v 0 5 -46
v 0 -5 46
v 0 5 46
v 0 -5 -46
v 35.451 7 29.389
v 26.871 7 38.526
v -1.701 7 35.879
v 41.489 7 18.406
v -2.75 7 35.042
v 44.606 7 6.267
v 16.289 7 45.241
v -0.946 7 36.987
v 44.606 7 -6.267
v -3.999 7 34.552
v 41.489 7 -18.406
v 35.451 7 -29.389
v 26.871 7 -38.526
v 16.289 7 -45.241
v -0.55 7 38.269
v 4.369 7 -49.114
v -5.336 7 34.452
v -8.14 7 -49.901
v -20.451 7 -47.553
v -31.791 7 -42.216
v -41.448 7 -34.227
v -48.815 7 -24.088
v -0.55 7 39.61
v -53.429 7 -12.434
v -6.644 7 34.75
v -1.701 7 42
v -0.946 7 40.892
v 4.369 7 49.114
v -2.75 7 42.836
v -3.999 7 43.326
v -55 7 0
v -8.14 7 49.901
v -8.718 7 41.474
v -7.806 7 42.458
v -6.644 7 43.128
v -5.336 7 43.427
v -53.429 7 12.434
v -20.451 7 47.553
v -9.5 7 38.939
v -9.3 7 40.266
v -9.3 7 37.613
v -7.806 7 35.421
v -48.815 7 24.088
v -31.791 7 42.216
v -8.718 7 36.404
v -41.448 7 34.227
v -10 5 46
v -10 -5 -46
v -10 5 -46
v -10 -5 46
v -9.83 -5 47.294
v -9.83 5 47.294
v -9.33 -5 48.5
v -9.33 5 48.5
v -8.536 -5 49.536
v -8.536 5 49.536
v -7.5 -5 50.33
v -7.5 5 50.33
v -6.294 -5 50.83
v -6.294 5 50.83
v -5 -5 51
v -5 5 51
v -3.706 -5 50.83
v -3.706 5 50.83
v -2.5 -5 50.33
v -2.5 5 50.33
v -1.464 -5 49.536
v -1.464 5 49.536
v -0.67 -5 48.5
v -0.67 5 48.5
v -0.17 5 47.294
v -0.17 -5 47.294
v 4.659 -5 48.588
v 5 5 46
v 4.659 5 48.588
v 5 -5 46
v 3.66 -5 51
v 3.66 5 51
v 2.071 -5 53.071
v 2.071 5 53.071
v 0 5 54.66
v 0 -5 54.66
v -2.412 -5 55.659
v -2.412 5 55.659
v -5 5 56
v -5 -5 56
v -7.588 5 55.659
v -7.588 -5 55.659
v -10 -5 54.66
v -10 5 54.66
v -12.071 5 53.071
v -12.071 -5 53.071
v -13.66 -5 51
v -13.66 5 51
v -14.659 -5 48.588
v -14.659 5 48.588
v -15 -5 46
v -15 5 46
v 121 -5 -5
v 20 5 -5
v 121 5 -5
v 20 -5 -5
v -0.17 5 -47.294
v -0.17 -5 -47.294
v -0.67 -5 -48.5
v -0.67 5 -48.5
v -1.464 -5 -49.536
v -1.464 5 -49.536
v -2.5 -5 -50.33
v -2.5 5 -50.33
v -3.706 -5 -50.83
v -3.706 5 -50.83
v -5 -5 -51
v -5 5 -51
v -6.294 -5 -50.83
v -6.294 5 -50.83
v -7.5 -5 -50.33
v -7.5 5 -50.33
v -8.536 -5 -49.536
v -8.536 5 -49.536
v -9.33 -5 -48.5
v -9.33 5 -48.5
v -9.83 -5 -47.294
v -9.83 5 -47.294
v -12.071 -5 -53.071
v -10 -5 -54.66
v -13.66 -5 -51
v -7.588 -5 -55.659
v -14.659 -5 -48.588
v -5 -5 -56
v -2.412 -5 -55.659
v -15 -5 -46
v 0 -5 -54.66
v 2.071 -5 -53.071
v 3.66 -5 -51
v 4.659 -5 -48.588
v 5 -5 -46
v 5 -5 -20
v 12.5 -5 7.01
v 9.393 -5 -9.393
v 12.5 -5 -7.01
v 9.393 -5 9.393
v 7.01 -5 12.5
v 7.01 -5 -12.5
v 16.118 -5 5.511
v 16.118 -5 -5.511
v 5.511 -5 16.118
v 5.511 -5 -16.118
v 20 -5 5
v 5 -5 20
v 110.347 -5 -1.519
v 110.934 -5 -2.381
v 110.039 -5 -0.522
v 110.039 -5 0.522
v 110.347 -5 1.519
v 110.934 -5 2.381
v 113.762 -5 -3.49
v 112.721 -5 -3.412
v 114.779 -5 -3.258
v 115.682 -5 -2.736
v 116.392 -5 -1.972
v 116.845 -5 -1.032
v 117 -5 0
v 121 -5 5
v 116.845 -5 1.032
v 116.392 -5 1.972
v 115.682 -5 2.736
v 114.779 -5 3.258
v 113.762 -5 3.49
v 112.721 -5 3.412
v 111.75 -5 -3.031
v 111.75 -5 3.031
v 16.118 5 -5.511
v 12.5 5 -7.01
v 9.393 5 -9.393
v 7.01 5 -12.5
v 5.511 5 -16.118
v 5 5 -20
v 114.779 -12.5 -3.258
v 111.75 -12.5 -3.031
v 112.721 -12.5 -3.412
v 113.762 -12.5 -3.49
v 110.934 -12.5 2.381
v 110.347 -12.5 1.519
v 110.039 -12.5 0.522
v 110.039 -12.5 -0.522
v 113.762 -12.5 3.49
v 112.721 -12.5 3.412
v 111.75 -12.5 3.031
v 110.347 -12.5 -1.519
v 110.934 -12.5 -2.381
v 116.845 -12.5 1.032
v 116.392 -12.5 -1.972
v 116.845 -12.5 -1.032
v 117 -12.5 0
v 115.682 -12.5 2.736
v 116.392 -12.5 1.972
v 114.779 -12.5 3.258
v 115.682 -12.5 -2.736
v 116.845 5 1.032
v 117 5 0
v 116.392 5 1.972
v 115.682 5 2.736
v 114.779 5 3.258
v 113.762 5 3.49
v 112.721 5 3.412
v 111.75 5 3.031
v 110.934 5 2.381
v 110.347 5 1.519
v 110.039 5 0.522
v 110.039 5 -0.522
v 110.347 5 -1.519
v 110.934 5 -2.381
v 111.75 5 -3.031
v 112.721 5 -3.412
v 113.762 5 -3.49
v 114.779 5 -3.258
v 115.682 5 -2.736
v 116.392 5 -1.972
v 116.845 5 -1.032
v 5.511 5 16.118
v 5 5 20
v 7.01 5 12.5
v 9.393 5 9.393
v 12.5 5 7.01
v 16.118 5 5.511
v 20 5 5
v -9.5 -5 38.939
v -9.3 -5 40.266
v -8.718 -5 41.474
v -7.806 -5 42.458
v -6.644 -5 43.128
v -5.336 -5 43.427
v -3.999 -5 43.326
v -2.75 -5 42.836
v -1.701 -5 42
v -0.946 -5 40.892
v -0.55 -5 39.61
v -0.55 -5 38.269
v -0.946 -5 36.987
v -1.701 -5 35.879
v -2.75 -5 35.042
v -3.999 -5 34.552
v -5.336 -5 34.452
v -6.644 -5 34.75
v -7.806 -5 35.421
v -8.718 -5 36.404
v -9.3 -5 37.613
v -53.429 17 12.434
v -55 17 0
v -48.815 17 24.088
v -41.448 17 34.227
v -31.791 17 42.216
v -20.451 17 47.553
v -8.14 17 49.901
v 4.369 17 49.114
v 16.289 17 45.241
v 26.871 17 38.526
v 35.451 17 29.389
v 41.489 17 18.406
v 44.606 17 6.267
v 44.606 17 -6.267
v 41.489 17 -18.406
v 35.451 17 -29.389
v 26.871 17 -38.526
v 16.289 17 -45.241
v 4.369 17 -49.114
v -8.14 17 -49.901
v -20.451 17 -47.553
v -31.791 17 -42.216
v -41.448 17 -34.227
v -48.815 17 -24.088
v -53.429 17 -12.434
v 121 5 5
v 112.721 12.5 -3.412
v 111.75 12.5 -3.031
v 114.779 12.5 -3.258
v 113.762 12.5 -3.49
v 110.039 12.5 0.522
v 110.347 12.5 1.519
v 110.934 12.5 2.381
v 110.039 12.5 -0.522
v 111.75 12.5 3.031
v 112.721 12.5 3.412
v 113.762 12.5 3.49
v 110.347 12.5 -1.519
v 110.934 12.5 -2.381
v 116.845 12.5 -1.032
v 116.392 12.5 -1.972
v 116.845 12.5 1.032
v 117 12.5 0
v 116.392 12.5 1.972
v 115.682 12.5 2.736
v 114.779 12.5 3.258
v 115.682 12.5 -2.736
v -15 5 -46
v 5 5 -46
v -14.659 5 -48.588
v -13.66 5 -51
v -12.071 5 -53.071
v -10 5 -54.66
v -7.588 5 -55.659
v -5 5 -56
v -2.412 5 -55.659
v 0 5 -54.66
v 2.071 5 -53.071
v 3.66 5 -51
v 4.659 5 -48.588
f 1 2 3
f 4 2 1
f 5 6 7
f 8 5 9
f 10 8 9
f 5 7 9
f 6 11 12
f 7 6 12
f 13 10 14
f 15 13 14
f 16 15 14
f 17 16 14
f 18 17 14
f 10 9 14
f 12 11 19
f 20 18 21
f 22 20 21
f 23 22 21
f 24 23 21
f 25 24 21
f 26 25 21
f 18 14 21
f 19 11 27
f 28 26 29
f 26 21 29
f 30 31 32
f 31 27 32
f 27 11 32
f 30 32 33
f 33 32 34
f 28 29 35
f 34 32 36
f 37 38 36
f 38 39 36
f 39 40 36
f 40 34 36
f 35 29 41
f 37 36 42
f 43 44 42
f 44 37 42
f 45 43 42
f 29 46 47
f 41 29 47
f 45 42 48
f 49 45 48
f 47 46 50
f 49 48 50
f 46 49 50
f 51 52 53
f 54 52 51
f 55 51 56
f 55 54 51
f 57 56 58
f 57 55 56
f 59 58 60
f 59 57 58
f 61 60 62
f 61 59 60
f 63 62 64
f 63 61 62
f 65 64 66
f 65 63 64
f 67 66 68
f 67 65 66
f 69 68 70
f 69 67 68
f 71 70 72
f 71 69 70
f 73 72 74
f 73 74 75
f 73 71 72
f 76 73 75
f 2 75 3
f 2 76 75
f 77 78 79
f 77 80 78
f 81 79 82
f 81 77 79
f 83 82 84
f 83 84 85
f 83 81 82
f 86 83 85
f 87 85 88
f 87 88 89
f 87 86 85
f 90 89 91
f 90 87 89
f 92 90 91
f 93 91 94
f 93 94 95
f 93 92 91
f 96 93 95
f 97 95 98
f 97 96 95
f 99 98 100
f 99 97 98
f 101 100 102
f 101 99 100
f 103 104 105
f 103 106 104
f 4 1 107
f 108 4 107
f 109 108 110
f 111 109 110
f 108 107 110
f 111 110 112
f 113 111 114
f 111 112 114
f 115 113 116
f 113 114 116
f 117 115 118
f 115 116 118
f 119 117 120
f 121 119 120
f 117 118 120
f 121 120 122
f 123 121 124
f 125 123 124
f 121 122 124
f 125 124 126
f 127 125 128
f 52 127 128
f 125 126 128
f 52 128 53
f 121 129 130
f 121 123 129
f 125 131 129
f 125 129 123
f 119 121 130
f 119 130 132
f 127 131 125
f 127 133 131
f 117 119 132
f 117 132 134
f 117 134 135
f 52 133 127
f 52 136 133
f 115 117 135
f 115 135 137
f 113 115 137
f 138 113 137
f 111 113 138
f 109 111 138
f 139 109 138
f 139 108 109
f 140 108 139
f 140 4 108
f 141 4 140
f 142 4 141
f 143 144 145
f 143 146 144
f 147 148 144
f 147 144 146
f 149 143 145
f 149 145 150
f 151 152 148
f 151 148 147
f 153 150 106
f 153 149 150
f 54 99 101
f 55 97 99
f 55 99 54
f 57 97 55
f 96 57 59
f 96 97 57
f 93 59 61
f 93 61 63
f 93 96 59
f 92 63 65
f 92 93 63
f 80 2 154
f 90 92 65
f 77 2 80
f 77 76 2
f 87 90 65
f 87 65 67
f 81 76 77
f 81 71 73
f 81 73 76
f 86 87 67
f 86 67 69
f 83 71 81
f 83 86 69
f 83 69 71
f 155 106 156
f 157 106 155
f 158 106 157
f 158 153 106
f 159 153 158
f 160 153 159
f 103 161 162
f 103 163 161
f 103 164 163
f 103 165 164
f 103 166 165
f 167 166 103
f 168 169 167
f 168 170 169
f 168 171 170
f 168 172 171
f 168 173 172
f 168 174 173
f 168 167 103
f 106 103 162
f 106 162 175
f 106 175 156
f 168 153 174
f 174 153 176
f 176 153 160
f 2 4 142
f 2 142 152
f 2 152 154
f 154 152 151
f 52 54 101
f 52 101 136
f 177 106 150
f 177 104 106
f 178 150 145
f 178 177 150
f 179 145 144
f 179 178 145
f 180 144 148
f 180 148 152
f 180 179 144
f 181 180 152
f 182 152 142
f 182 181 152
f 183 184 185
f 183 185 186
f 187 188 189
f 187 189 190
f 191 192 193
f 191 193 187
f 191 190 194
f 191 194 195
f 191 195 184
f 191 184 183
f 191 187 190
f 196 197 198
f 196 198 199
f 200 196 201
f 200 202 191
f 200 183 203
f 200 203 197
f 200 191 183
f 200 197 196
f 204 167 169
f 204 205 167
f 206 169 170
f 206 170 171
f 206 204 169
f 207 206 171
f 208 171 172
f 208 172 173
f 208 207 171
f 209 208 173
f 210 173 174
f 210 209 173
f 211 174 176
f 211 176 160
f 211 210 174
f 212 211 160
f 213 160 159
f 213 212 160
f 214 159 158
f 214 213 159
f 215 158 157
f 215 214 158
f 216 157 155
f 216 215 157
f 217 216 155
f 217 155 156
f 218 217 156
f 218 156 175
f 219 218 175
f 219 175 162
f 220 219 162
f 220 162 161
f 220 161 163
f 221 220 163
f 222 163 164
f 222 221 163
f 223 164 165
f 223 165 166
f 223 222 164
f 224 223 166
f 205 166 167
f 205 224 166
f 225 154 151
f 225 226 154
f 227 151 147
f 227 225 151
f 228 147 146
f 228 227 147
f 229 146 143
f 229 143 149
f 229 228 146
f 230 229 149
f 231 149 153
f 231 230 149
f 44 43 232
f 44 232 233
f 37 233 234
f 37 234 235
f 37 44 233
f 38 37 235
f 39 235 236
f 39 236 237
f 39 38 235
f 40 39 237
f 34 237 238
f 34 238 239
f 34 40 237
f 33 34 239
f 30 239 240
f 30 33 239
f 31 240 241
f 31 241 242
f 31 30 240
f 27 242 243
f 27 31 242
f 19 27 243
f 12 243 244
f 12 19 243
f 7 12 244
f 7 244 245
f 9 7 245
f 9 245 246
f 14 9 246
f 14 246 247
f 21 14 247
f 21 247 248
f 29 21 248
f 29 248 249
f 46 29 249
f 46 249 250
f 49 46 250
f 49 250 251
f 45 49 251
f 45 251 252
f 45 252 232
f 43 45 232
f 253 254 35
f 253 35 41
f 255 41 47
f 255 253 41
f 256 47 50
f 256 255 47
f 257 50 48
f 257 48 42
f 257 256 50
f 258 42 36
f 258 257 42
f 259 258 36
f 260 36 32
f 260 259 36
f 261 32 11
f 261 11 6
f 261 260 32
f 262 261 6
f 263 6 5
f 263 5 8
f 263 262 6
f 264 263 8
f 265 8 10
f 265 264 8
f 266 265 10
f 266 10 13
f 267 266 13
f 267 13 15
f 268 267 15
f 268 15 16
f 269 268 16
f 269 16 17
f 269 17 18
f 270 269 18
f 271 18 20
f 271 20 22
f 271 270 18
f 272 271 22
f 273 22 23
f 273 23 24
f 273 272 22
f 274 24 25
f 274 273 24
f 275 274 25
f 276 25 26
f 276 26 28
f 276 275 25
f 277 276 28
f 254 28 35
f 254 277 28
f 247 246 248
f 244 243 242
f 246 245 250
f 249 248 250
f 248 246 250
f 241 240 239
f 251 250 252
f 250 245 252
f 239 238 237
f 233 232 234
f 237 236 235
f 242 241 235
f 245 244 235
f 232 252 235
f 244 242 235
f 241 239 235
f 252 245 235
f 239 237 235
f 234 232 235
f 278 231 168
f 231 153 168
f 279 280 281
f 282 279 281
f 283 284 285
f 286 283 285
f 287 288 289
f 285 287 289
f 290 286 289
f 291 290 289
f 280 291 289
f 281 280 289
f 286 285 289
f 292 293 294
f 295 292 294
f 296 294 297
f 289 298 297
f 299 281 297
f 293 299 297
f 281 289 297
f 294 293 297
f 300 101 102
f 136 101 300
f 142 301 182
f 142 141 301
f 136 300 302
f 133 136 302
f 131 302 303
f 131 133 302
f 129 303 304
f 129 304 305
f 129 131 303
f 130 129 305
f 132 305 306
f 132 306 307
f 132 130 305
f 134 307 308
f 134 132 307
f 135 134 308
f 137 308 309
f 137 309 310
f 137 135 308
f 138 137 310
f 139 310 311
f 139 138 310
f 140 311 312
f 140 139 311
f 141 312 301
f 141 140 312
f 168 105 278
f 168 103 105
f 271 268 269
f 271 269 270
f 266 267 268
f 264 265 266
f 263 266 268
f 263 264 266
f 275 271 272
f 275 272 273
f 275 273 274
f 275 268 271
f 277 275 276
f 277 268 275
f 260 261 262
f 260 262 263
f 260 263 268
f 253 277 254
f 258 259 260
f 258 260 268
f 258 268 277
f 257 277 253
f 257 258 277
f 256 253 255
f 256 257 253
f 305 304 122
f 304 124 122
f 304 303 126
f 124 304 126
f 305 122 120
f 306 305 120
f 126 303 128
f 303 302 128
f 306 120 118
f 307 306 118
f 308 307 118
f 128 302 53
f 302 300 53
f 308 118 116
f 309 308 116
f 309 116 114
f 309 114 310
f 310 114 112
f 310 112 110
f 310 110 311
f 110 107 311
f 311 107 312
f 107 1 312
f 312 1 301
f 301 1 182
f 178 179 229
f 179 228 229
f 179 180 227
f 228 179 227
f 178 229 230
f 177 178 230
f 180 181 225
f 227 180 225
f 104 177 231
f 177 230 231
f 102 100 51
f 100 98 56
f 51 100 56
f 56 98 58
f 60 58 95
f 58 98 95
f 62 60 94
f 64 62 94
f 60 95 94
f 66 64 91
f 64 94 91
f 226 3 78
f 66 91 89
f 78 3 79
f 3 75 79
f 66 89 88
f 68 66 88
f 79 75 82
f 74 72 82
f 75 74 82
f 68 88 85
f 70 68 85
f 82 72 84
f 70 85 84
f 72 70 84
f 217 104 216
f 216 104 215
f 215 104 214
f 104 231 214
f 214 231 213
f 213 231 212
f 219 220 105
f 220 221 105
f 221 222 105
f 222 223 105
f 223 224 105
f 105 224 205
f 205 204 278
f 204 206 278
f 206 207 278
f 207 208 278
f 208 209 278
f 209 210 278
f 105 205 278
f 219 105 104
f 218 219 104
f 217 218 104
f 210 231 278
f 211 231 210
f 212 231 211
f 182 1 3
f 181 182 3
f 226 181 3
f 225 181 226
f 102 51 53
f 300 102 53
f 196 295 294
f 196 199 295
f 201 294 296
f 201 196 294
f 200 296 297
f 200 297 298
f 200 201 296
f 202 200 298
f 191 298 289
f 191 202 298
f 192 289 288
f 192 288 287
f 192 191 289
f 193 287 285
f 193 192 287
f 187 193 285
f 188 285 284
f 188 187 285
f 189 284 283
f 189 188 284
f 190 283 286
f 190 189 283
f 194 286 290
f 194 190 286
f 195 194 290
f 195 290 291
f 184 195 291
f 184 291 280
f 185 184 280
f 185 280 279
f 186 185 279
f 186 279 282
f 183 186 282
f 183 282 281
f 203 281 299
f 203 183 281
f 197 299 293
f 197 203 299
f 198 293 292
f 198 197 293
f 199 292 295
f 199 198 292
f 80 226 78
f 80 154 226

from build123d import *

# Parameters (mm, degrees)
F0_W     = 116
F0_H     = 10
F0_R     = 3.5
F1_DEPTH = 5
F3_R     = 50
F3_R_2   = 4.5
F4_DEPTH = 10
F5_DEPTH = 22
F6_R     = 15
F7_DEPTH = 12.5


with BuildPart() as f1:
    # F0 (on Front) → F1 (new body, symmetric)
    with BuildSketch(Plane.XZ):
        with BuildLine():
            ThreePointArc((5, 46), (2.0710678119, 53.0710678119), (-5, 56))
            ThreePointArc((-5, 56), (-12.0710678119, 53.0710678119), (-15, 46))
            Line((-15, 46), (-15, -46))
            ThreePointArc((-15, -46), (-12.0710678119, -53.0710678119), (-5, -56))
            ThreePointArc((-5, -56), (2.0710678119, -53.0710678119), (5, -46))
            Line((5, -46), (5, -5))
            Line((5, -5), (5, 5))
            Line((5, 5), (5, 46))
        make_face()
        with BuildLine():
            ThreePointArc((-5, 51), (-1.4644660941, 49.5355339059), (0, 46))
            Line((0, 46), (0, -46))
            ThreePointArc((0, -46), (-1.4644660941, -49.5355339059), (-5, -51))
            ThreePointArc((-5, -51), (-8.5355339059, -49.5355339059), (-10, -46))
            Line((-10, -46), (-10, 46))
            ThreePointArc((-10, 46), (-8.5355339059, 49.5355339059), (-5, 51))
        make_face(mode=Mode.SUBTRACT)
        with Locations((63, 0)):
            Rectangle(F0_W, F0_H)
        with Locations((113.5, 0)):
            Circle(F0_R, mode=Mode.SUBTRACT)
    extrude(amount=F1_DEPTH, both=True)

    # F6
    f6_edges = [f1.edges().sort_by_distance(p)[0] for p in [
        (5, 0, 5),
        (5, 0, -5),
    ]]
    fillet(f6_edges, radius=F6_R)


with BuildPart() as f4:
    # F3 (on offset) → F4 (new body)
    with BuildSketch(Plane(origin=(0, 17, 0), x_dir=(-1, 0, 0), z_dir=(0, 1, 0))):
        with Locations((5, 0)):
            Circle(F3_R)
        with Locations((5, 38.9393063534)):
            Circle(F3_R_2, mode=Mode.SUBTRACT)
        with Locations((5, 38.9393063534)):
            Circle(F3_R_2)
    extrude(amount=-F4_DEPTH)

    # F3 (on offset) → F5 (join, through all)
    with BuildSketch(Plane(origin=(0, 17, 0), x_dir=(-1, 0, 0), z_dir=(0, 1, 0))):
        with Locations((5, 38.9393063534)):
            Circle(F3_R_2)
    extrude(amount=-F5_DEPTH)


with BuildPart() as f7:
    # F0 (on Front) → F7 (new body, symmetric)
    with BuildSketch(Plane.XZ):
        with Locations((113.5, 0)):
            Circle(F0_R)
    extrude(amount=F7_DEPTH, both=True)


solid = Compound([f1.part, f4.part, f7.part])
